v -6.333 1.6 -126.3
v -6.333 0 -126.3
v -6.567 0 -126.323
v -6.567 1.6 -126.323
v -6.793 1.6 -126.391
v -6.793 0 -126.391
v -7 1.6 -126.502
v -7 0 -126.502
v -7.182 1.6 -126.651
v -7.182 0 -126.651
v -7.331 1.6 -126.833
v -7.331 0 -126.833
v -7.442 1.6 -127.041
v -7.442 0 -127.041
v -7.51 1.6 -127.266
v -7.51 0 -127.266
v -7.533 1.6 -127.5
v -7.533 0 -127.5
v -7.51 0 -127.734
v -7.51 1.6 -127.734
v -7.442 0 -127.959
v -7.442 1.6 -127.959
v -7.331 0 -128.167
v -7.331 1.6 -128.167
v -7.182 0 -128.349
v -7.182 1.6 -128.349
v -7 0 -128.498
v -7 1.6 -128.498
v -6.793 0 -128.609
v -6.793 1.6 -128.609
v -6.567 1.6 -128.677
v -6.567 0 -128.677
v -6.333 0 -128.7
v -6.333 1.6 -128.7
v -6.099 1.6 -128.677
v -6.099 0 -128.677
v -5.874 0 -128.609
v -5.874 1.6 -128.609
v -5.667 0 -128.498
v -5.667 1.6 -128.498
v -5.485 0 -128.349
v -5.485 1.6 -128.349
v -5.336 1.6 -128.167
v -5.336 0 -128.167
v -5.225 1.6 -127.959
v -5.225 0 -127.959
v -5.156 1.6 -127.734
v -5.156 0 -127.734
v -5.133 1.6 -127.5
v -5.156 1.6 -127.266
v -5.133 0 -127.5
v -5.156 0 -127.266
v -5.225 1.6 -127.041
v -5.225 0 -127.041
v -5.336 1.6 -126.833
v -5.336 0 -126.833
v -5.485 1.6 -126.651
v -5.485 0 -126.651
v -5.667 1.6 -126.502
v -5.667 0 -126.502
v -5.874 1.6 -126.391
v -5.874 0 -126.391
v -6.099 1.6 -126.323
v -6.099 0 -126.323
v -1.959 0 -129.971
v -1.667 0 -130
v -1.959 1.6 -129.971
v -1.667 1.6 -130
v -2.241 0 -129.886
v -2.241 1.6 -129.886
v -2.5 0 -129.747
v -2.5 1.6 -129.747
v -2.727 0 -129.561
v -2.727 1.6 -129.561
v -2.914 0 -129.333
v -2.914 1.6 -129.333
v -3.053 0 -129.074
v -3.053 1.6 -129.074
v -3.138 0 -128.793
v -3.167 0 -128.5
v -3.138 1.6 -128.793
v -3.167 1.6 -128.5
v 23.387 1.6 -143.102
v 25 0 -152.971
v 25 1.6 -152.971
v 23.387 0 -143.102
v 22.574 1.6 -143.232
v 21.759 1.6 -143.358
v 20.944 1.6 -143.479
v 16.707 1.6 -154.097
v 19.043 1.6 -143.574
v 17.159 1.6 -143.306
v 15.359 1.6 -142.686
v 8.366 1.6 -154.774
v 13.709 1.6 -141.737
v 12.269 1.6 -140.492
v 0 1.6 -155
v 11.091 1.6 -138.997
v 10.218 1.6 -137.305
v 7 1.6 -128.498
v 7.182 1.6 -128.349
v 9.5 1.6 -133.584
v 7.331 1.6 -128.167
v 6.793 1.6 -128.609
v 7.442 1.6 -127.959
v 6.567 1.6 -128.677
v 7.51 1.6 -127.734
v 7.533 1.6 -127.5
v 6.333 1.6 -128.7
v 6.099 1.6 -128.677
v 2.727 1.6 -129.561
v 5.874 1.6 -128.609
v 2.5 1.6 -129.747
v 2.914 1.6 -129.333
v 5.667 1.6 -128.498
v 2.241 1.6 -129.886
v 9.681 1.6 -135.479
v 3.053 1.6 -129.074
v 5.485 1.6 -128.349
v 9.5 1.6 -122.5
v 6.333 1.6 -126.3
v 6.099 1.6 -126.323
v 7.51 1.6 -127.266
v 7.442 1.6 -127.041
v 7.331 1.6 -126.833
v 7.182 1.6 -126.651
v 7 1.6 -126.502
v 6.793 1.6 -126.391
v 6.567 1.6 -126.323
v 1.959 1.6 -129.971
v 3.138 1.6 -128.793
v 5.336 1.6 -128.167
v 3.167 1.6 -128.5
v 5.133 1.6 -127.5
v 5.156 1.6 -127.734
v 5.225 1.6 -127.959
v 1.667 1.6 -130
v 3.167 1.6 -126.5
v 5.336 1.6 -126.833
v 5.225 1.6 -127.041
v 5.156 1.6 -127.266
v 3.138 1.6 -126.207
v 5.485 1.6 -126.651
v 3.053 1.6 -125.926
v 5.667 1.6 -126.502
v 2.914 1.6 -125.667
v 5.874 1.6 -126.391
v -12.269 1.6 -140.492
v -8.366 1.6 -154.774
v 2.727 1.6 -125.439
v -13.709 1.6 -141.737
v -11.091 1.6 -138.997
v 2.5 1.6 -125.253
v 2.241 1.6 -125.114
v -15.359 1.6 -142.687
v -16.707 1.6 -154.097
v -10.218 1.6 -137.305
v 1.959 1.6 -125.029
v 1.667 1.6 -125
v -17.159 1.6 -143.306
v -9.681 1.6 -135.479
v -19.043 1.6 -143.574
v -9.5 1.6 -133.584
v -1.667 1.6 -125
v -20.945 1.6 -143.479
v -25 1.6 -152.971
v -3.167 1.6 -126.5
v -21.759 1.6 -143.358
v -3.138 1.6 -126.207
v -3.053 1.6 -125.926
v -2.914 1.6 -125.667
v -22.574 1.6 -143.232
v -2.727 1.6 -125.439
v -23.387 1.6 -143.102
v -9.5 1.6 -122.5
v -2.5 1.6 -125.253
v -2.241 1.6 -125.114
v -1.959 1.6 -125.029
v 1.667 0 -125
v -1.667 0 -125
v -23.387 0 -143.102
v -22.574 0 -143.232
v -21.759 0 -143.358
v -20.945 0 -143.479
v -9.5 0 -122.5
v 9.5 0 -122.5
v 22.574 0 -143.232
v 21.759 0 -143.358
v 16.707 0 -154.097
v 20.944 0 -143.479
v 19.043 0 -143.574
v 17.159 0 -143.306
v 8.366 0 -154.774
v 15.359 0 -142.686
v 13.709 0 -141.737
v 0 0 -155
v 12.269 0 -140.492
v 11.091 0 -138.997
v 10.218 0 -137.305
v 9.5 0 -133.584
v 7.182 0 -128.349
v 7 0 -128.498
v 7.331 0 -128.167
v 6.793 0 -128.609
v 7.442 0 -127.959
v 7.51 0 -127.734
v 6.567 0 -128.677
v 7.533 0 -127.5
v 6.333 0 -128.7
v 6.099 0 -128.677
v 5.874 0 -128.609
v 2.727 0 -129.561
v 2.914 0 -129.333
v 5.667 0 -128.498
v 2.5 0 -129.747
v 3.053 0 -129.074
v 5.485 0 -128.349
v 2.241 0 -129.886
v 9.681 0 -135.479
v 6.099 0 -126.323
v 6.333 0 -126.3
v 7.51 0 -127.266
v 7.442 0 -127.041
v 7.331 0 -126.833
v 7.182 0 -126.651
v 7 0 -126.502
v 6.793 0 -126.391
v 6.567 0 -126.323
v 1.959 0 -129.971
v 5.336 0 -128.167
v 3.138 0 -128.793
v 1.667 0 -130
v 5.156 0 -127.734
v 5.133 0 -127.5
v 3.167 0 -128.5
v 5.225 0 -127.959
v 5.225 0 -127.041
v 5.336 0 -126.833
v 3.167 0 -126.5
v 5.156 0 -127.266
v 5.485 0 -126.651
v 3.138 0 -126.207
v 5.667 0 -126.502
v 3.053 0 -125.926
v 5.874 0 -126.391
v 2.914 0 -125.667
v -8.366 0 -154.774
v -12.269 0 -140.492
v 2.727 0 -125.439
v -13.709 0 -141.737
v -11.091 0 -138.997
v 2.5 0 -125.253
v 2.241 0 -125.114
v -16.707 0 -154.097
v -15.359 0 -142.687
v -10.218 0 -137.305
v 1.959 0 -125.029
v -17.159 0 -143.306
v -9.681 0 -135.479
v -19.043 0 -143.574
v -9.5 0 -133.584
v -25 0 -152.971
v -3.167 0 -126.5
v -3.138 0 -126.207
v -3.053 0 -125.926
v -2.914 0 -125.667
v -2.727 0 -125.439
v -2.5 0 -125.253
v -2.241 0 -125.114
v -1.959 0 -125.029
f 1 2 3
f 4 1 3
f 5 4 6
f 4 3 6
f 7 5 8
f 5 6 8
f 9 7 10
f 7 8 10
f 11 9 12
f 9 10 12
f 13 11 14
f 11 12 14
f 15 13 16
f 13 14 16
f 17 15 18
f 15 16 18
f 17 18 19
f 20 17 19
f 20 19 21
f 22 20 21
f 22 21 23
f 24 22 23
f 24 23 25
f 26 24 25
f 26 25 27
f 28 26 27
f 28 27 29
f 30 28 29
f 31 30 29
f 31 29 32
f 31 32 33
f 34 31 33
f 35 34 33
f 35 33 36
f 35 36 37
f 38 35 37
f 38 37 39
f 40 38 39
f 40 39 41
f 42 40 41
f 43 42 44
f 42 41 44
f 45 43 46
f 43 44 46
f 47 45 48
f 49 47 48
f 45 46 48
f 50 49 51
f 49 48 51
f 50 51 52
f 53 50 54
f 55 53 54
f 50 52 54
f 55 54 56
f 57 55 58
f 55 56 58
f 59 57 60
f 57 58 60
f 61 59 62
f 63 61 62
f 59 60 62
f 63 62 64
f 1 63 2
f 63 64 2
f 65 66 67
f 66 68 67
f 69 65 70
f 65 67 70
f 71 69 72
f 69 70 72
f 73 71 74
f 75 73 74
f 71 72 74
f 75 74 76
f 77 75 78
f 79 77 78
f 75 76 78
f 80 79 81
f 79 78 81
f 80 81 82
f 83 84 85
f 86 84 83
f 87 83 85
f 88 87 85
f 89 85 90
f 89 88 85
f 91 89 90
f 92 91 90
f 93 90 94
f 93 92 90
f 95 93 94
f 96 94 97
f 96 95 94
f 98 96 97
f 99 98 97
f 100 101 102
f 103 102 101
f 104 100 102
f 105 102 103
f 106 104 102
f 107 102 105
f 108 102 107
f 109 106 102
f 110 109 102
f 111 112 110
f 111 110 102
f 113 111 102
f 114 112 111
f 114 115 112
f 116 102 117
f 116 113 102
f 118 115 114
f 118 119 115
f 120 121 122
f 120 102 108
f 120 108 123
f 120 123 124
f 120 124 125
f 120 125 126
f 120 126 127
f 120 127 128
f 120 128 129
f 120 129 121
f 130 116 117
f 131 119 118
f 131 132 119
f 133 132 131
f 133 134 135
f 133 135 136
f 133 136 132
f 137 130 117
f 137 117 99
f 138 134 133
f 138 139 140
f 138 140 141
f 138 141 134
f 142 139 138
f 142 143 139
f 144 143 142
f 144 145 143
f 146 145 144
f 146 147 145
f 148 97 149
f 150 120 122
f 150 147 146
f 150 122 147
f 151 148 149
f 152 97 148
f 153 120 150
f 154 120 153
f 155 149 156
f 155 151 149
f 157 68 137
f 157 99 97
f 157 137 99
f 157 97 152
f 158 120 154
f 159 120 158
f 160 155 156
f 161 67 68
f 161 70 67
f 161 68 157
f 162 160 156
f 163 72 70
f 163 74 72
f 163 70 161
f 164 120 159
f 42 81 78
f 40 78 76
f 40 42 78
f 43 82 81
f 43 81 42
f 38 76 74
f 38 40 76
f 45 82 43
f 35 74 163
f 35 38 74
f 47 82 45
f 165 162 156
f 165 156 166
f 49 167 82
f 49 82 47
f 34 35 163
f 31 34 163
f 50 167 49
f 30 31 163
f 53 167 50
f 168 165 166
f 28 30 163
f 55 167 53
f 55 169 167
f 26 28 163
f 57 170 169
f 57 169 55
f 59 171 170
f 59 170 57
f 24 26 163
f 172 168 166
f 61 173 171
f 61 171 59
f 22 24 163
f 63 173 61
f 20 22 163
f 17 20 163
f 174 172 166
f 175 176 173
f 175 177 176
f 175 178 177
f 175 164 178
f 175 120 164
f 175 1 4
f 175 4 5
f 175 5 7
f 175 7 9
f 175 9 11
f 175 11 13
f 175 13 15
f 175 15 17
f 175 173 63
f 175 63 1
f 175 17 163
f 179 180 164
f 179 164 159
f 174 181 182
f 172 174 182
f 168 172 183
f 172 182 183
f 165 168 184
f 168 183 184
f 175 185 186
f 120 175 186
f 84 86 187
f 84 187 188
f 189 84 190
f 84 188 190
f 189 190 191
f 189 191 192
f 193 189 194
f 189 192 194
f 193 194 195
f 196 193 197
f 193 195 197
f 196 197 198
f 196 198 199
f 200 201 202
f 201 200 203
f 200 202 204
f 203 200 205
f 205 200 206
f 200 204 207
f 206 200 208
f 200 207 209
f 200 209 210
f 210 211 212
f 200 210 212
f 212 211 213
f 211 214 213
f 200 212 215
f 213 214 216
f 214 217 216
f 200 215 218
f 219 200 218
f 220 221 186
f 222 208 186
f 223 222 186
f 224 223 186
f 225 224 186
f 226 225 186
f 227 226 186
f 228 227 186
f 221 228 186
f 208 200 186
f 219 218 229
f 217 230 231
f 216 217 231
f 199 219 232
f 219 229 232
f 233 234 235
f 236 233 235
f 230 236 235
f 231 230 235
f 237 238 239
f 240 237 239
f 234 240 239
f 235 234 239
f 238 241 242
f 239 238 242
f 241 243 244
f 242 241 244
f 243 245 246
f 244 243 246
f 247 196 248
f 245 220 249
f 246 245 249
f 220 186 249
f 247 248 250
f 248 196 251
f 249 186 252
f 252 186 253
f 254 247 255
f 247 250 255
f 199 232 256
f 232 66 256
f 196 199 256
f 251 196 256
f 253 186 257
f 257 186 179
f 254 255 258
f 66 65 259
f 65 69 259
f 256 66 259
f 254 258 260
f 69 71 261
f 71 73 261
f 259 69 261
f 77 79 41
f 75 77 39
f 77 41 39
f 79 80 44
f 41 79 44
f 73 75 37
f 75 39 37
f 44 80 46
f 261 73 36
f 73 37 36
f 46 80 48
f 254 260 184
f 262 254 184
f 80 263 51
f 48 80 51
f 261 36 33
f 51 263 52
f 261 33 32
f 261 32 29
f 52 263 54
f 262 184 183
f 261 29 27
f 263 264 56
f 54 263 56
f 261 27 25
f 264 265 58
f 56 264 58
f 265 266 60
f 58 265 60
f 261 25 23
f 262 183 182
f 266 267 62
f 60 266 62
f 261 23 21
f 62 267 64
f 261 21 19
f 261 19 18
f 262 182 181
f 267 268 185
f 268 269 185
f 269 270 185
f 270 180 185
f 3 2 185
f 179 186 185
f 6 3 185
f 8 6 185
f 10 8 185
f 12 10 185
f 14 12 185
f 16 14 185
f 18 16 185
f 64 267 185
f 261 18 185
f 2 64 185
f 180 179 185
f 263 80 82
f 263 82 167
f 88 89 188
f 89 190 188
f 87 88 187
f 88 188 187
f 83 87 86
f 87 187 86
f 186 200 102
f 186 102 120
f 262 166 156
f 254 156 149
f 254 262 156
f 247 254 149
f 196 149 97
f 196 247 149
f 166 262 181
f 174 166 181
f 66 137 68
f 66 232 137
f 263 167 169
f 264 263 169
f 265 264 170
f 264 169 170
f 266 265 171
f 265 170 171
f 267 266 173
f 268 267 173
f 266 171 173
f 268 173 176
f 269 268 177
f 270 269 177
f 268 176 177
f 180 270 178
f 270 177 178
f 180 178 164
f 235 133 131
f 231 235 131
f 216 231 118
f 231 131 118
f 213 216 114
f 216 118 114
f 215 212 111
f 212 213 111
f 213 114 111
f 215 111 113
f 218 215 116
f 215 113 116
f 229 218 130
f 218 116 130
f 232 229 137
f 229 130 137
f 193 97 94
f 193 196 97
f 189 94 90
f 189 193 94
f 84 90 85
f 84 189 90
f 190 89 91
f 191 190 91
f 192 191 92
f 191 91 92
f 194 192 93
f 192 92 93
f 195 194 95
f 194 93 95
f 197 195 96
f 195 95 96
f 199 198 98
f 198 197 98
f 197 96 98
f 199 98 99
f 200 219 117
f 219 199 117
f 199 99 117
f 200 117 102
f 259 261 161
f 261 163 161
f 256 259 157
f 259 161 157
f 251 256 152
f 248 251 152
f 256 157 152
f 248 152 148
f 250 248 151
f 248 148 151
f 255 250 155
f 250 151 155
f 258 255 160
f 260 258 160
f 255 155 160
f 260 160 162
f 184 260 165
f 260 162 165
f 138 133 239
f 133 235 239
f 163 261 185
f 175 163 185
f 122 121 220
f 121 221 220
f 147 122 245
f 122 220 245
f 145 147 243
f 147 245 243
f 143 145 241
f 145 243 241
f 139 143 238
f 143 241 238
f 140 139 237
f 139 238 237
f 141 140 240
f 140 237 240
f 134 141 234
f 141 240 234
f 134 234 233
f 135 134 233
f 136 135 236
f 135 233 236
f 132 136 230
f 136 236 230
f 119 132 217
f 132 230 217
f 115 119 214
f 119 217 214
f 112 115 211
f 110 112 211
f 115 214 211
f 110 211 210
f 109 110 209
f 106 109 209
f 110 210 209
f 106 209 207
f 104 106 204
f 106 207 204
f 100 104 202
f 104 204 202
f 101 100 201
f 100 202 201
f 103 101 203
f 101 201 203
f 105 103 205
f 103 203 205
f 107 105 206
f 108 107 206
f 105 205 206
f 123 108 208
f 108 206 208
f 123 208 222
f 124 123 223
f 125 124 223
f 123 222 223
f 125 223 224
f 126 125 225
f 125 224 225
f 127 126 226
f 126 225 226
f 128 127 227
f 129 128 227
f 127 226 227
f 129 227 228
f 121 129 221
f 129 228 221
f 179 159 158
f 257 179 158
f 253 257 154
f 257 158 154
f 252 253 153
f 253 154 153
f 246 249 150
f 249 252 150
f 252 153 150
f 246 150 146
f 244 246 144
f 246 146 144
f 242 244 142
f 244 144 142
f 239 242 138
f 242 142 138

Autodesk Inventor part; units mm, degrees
ref_plane "YZ Plane" through (0, 0, 0) normal (1, 0, 0) x (0, 1, 0)
ref_plane "XZ Plane" through (0, 0, 0) normal (0, 1, 0) x (-1, 0, 0)
ref_plane "XY Plane" through (0, 0, 0) normal (0, 0, 1) x (1, 0, 0)
sketch "スケッチ1" plane through (0, 0, 0) normal (0, 1, 0) x (-1, 0, 0)
  arc A0 (0, -155) -> (25, -152.9706) centre (0, 0) ccw
  line L0 (25, -152.9706) -> (0, 0)
  line L1 (0, 0) -> (0, -144.6885)
  arc A1 (9.5, -144.6885) -> (23.3871, -143.1015) centre (0, 0) ccw
  line L2 (9.5, -144.6885) -> (9.5, -122.5)
  line L3 (9.5, -122.5) -> (0, -122.5)
  arc A2 (-25, -152.9706) -> (0, -155) centre (0, 0) ccw
  line L4 (-25, -152.9706) -> (0, 0)
  arc A3 (-23.3871, -143.1015) -> (-9.5, -144.6885) centre (0, 0) ccw
  line L5 (-9.5, -144.6885) -> (-9.5, -122.5)
  line L6 (-9.5, -122.5) -> (0, -122.5)
  line L7 (9.5, -144.6885) -> (0, -144.6885) construction
  line L8 (-9.5, -144.6885) -> (0, -144.6885) construction
  line L9 (-9.5, -180.2611) -> (-9.5, 6.4286)
  line L10 (9.5, -180.2611) -> (9.5, 6.4286)
  line L11 (0, -130) -> (-3.1667, -130)
  line L12 (-3.1667, -130) -> (-3.1667, -125)
  line L13 (-3.1667, -125) -> (0, -125)
  line L14 (0, -130) -> (3.1667, -130)
  line L15 (3.1667, -130) -> (3.1667, -125)
  line L16 (3.1667, -125) -> (0, -125)
  line L17 (0, -144.6885) -> (0, -145)
  line L18 (0, -145) -> (0, -155)
  point P0 (0, -125)
  point P1 (0, -150)
  dimension "d4" = 19
  dimension "d12" = 122.5
  dimension "d13" = 10
  dimension "d29" = 19
  dimension "d32" = 5
  dimension "d33" = 6.3333
  dimension "d34" = 2.5
  dimension "d36" = 50
  dimension "d38" = 150
extrude "押し出し1" add sketch "スケッチ1" along normal blind 1.6 contours L18 L17 L1 L14 L15 L16 L3 L2 L10 A0 | A2 L9 L5 L6 L1 L13 L12 L11 L17 L18 | L10 A1 L0 A0 | A2 L4 A3 L9
sketch "スケッチ2" plane through (0, 1.6, 0) normal (0, 1, 0) x (1, 0, 0)
  line L0 (9.5, 122.5) -> (9.5, 144.6885) projected
  arc A0 (23.3871, 143.1015) -> (9.5, 144.6885) centre (0, 0) ccw projected
  line L1 (23.3871, 143.1015) -> (25, 152.9706) projected
  arc A1 (25, 152.9706) -> (-25, 152.9706) centre (0, 0) ccw projected
  line L2 (-25, 152.9706) -> (-23.3871, 143.1015) projected
  arc A2 (-9.5, 144.6885) -> (-23.3871, 143.1015) centre (0, 0) ccw projected
  line L3 (-9.5, 144.6885) -> (-9.5, 122.5) projected
  line L4 (-9.5, 122.5) -> (9.5, 122.5) projected
  line L5 (-9.5, 122.5) -> (5.5, 122.5)
  line L6 (5.5, 122.5) -> (5.5, 132.5)
  line L7 (5.5, 132.5) -> (-9.5, 132.5)
  line L8 (-9.5, 132.5) -> (-9.5, 122.5)
  line L9 (-6.3333, 127.5) -> (-3.1667, 127.5) construction
  line L10 (-6.3333, 127.5) -> (-9.5, 127.5) construction
  line L11 (-3.1667, 125) -> (-3.1667, 130) projected
  point P0 (6.3333, 127.5)
  dimension "d19" = 10
  dimension "d20" = 15
hole "穴1" at (6.3333, 1.6, -127.5) at (-6.3333, 1.6, -127.5) direction (0, -1, 0) diameter 2.4 depth 1.6 clearance for "Countersunk Flat Head Screw ISO 2009/7046" size "M2" standard "ISO"
fillet "フィレット1" radius 10 2 edges at (9.5, 0.8, -144.6885) (-9.5, 0.8, -144.6885)
fillet "フィレット2" radius 1.5 4 edges at (-3.1667, 0.8, -130) (3.1667, 0.8, -125) (3.1667, 0.8, -130) (-3.1667, 0.8, -125)
properties part number "sensor" material "エポキシ樹脂"
